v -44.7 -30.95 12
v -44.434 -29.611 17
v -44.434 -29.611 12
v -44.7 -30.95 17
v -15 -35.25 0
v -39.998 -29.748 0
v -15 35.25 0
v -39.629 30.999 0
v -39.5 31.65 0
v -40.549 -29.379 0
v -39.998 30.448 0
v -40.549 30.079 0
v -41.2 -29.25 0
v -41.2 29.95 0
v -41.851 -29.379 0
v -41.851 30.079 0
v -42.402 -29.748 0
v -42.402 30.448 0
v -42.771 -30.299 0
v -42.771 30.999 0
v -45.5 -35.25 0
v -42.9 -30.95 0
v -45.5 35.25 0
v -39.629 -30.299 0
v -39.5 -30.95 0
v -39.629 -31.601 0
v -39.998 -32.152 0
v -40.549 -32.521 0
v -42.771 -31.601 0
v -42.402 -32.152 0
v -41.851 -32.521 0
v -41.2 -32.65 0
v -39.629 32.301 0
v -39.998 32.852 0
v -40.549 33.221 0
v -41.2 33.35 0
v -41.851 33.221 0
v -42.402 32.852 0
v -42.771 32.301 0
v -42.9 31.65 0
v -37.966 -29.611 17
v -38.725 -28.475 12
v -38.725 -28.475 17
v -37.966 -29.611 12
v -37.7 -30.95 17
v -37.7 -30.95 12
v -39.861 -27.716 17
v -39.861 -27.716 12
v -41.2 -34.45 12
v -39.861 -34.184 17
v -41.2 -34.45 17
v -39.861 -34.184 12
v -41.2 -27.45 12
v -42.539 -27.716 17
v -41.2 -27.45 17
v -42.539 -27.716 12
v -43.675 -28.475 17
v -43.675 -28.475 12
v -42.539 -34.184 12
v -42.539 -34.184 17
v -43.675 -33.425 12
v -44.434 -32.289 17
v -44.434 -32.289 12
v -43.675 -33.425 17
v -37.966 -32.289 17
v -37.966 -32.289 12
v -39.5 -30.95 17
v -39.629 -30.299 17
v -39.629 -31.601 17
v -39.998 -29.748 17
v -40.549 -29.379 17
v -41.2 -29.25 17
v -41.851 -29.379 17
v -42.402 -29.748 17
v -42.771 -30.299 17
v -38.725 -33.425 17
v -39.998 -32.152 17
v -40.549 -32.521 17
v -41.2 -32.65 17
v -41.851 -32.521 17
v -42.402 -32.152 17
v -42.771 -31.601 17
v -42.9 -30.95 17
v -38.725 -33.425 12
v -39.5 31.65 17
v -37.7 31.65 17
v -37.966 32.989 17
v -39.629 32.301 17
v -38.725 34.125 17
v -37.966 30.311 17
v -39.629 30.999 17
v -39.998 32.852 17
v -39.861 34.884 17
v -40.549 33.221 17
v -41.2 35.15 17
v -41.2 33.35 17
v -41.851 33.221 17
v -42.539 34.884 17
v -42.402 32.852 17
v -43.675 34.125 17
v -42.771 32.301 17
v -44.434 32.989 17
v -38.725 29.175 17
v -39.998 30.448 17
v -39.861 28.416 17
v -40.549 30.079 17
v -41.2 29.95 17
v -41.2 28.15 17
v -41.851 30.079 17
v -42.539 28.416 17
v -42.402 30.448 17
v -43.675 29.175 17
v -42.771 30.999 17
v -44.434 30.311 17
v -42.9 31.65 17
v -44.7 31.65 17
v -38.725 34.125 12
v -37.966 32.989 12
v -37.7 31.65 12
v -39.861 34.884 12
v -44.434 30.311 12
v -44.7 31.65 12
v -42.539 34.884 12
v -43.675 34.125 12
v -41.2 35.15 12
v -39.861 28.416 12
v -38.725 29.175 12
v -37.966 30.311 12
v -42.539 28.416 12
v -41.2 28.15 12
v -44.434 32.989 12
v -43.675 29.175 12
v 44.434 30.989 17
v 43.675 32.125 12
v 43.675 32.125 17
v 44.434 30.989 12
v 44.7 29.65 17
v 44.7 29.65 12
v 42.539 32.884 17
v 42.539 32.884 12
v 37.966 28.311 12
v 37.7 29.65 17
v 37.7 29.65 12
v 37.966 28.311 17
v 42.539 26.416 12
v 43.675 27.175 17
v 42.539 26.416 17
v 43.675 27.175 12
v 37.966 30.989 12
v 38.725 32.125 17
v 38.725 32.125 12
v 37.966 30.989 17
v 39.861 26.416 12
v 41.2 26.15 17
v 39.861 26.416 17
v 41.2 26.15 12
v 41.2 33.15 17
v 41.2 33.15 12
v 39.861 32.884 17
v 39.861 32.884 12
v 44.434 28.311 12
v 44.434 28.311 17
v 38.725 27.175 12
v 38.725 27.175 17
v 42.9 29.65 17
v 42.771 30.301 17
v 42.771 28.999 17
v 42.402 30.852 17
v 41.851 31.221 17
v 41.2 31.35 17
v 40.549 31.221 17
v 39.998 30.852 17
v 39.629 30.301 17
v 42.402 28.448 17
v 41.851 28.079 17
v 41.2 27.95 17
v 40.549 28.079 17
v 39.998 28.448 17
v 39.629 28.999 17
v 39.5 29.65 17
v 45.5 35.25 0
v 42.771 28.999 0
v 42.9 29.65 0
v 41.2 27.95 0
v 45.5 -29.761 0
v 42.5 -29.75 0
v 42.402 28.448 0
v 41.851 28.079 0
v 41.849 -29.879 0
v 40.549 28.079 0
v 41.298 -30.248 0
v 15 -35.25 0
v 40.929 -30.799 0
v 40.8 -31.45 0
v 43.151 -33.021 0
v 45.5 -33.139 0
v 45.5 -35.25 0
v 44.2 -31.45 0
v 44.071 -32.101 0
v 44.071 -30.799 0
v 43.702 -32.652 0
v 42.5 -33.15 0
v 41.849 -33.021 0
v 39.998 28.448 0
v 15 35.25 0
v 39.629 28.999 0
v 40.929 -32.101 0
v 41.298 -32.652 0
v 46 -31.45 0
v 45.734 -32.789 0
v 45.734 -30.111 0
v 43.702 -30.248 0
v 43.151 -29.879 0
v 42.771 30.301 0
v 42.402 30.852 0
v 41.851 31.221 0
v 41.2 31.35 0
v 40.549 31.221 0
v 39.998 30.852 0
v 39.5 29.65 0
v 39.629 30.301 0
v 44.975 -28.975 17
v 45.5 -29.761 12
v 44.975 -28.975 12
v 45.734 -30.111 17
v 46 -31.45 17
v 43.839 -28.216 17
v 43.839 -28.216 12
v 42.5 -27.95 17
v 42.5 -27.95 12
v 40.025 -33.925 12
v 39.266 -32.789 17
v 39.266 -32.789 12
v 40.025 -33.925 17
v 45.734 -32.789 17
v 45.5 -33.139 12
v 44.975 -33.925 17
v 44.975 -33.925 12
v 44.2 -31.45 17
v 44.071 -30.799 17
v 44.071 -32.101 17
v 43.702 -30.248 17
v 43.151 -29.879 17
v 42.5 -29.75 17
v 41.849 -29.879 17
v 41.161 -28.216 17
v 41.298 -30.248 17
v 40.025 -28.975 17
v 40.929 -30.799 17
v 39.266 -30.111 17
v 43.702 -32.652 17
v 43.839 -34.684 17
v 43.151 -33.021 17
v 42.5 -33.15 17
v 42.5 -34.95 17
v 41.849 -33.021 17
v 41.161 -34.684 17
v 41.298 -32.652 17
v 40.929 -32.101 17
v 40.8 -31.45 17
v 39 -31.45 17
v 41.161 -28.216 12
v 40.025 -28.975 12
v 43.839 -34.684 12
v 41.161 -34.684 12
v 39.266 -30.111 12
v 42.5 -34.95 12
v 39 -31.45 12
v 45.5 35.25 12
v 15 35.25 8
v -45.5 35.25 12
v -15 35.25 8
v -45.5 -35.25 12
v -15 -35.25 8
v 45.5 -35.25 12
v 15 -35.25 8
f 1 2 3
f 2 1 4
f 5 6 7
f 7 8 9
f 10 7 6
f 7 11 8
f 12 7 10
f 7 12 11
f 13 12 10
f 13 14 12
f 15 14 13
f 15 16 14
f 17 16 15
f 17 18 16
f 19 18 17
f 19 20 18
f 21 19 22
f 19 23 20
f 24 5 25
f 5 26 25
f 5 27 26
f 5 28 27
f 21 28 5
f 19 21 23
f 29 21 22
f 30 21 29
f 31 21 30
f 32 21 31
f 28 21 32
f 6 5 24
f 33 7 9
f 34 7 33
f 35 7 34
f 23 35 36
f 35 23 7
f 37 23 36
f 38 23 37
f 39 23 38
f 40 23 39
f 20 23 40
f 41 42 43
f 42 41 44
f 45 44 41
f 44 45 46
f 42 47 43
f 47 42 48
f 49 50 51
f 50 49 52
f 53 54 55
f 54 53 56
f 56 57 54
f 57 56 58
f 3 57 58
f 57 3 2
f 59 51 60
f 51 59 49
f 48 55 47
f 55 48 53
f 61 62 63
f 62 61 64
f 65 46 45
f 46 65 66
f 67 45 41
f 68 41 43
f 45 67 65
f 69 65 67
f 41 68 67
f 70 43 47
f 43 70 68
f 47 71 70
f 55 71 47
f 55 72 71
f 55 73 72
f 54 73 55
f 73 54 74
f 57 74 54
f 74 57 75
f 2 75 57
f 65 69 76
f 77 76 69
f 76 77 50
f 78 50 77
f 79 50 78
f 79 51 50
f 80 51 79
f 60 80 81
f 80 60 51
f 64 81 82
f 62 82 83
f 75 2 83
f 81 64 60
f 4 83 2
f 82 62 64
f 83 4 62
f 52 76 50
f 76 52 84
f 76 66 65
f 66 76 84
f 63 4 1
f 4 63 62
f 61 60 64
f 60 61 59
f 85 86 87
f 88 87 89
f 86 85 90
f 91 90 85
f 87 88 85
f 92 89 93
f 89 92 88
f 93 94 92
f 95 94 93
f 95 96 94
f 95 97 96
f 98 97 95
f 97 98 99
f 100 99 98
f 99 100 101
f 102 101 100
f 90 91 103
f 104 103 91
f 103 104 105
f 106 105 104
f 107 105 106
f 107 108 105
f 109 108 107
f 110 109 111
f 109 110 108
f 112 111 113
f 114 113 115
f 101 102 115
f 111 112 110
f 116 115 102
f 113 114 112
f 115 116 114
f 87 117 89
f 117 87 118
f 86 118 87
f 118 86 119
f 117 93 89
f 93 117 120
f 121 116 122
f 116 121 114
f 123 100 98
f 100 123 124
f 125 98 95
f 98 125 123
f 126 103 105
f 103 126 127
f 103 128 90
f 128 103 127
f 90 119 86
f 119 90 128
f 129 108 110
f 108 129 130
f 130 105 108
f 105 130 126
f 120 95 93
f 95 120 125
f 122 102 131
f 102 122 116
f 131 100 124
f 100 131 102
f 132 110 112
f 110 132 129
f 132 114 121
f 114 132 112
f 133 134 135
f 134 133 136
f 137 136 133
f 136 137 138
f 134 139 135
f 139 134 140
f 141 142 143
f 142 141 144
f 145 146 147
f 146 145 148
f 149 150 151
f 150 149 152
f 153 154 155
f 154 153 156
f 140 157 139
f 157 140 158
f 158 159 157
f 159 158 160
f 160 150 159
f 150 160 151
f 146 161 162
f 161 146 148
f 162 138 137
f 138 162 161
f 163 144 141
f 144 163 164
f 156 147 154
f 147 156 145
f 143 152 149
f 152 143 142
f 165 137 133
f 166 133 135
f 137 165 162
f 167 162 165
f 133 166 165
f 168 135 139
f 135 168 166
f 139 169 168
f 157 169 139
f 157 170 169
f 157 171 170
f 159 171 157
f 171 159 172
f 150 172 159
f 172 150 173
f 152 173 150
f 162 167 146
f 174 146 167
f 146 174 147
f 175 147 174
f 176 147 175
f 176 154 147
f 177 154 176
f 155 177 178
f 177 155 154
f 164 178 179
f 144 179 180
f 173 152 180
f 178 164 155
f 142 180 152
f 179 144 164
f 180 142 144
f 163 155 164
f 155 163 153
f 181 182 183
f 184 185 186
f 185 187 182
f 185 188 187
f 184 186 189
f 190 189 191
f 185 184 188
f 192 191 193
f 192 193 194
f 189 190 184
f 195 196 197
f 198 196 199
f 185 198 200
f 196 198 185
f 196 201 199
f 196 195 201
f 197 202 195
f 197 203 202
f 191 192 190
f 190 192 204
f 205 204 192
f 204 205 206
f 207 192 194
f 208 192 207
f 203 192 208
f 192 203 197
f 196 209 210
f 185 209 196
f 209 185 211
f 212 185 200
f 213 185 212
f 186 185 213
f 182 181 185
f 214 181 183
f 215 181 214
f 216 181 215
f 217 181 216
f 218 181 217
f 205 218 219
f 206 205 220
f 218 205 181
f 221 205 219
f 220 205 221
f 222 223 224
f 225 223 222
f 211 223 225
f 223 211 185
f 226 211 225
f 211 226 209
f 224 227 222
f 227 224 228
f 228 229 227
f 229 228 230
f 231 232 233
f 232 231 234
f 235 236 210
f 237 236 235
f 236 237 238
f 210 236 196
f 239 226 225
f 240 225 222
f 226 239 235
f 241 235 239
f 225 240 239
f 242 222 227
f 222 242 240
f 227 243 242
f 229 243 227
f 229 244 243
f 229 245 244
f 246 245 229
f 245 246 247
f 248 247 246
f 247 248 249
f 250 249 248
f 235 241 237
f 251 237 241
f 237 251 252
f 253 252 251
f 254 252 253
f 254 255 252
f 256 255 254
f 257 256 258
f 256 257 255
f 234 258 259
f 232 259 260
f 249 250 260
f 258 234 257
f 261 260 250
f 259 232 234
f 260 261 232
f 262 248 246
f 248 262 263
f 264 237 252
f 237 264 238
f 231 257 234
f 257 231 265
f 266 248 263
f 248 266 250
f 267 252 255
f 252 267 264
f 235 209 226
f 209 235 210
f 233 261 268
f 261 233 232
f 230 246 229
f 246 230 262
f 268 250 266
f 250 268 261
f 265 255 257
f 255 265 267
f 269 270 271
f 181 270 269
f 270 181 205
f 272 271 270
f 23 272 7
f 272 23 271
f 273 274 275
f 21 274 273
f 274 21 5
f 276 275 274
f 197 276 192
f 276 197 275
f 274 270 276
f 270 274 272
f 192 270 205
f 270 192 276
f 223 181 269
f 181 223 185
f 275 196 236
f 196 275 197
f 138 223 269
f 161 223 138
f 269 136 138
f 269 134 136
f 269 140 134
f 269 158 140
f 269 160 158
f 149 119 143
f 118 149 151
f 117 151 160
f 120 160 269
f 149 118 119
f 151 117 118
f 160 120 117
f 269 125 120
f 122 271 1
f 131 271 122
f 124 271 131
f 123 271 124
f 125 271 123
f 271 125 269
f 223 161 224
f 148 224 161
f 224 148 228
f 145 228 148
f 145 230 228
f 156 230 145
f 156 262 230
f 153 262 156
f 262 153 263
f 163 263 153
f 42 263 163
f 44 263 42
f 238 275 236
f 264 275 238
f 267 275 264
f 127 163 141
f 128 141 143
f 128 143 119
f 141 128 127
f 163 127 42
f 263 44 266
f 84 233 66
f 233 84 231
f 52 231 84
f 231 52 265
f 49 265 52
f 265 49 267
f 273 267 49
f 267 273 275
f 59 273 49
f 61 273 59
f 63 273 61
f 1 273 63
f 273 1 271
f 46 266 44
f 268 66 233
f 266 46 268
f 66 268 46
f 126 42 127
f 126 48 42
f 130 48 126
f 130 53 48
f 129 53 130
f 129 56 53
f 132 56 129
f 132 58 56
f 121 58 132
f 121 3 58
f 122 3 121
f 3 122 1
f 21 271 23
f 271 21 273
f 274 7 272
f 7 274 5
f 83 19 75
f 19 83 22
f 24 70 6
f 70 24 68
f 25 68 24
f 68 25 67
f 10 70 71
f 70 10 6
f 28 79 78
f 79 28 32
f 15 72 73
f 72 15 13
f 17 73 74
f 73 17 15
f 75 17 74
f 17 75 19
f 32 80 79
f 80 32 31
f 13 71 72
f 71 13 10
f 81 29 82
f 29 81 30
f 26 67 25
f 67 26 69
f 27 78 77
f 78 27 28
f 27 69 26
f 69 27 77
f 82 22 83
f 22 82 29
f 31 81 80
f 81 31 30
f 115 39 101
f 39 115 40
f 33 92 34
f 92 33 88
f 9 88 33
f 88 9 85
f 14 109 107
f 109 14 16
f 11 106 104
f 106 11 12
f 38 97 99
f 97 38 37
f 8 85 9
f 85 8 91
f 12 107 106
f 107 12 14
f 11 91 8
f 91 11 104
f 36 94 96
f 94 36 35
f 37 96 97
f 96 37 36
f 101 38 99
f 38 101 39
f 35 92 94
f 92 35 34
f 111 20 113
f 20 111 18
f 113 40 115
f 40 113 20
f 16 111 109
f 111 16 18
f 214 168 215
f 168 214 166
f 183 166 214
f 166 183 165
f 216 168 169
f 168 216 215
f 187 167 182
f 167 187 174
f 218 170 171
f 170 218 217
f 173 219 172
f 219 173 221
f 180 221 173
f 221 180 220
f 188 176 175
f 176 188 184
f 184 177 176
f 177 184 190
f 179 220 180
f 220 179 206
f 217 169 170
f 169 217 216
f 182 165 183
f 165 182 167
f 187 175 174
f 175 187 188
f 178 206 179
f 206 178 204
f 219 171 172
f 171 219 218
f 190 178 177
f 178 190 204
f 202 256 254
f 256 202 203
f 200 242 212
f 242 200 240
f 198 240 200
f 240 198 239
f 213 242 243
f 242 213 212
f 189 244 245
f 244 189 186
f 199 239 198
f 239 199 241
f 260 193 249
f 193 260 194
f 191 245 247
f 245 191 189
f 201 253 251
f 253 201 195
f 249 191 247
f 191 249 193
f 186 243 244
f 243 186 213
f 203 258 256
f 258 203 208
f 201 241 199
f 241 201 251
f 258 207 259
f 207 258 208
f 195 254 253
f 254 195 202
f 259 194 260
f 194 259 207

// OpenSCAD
//electronics enclosure 
base_w = 80;
base_l = 85;
base_screw_y_offs = 18;
base_screw_d = 3;
base_t = 4;
wall_t = 2;
xy_clearence = 3;
xy_tol = 0.2;

//body (jeep)
body_rear_mount_w = 91;
body_rear_mount_z = 12;
body_rear_mount_x = -80; 
body_front_mount_w = 67;
body_front_mount_z = 32;
body_front_mount_x = 140;
interior_clearence = 52;

//electronics 
perf_board_w = 70.5;
perf_board_l = 91;
perf_board_t = 1.2; 
perf_board_hole_d = 3;
perf_board_holes = [
    [-perf_board_l/2+4.3, -perf_board_w/2+4.3],
    [-perf_board_l/2+4.3, perf_board_w/2-3.6],
    [perf_board_l/2-4.3, perf_board_w/2-5.6],
    [perf_board_l/2-3, -perf_board_w/2+3.8],
];



enclosure_w = perf_board_w + 2*(xy_clearence + wall_t);
enclosure_l = perf_board_l + 2*(xy_clearence + wall_t);
enclosure_x_offs = 8;
enclosure_z_offs = 12;
enclosure_h = 50;

//hardware
bolt_d = 3;
nut_w = 5.4;
nut_r = nut_w/(2*cos(30));
nut_h = 2.27;
nut_tol = nut_h + xy_tol + wall_t;


//echo(nut_r);


//assembly();

module assembly() {
    
    
    
    translate([enclosure_x_offs,0,10]) {
        translate([0,0,enclosure_z_offs + 12])
        board();
        
        translate([0,0,enclosure_z_offs + 12 + 25])
        board();
    }

    
    electronics_base();

    body();
    
}



module body() {
    
    for(i=[-body_rear_mount_w/2,body_rear_mount_w/2])
    translate([body_rear_mount_x,i,body_rear_mount_z])
    cylinder(r=4, h = 30);
    
    for(i=[-body_front_mount_w/2,body_front_mount_w/2])
    translate([body_front_mount_x,i,body_front_mount_z])
    cylinder(r=4, h = 30);
    
}

  //  linear_extrude(12)
    //square([10, 10], center=true);
    

module nut_negative() {
    cylinder(r=nut_r+xy_tol,h = nut_h + 2*xy_tol, $fn=6);
    translate([0,0,-2])
    cylinder(r=bolt_d/2+xy_tol, h = 30, $fn=16, center = true);
}

/*
difference() {
    cylinder(r=7, h=8);

    translate([0,0,8 - nut_tol])
    nut_negative();
}
*/

//electronics_base();
module electronics_base() {
    
    
difference() {
    union() {
    difference() {
        
        //body exterior, screw mounts for lid
        union() {
            linear_extrude(12)
            square([base_l, base_w], center=true);
            
            hull() {
                translate([0,0,12])
                linear_extrude(1)
                square([base_l, base_w], center=true);
                
                
                translate([enclosure_x_offs, 0, enclosure_z_offs + 12])
                linear_extrude(1)
                square([enclosure_l, enclosure_w], center=true);
            }
            
              translate([enclosure_l/2 + enclosure_x_offs - enclosure_z_offs - 12 - 1,0,0]) 
           multmatrix([
            [1,0,1,0],
            [0,1,0,0],
            [0,0,1,0],
            [0,0,0,1]
           ])
           cylinder(h = enclosure_z_offs + 12 + 1, r1 = 15, r2=10);
           
           translate([- enclosure_l/2 + enclosure_x_offs ,0,0]) 
           cylinder(h = enclosure_z_offs + 12 + 1, r1 = 0, r2=10);

        }
            
        //interior of base
        translate([0,0,3])
        linear_extrude(12)
        square([base_l-2*wall_t , base_w-2*wall_t], center=true);
        
        //interior space
        hull() {
            translate([0,0,12])
            linear_extrude(1)
            square([base_l-2*wall_t, base_w-2*wall_t], center=true);
            
            translate([enclosure_x_offs, 0, enclosure_z_offs + 12])
            linear_extrude(1)
            square([enclosure_l-2*wall_t, enclosure_w-2*wall_t], center=true);
             
            translate([enclosure_x_offs, 0, enclosure_z_offs + 12 + 1])
            linear_extrude(1)
            square([enclosure_l-2*wall_t, enclosure_w-2*wall_t], center=true);
        }
        
        //bottom screw hole
        translate([-base_l/2 + base_screw_y_offs, 0])
        cylinder(r=base_screw_d/2+xy_tol, h = 15, $fn=16, center = true);
       
    }
    
    //board mounts
    intersection() {
        union()
        translate([enclosure_x_offs,0,0]) {
            translate([-enclosure_l/2, -enclosure_w/2, enclosure_z_offs + 12 + 1 ])
            corner_support();
            
            translate([-enclosure_l/2, enclosure_w/2, enclosure_z_offs + 12 + 1 ])
            mirror([0,1,0])
            corner_support();
            
            translate([enclosure_l/2, -enclosure_w/2, enclosure_z_offs + 12 + 1 ])
            rotate(90)
            corner_support();
            
            translate([enclosure_l/2, enclosure_w/2, enclosure_z_offs + 12 + 1 ])
            mirror([0,1,0])
            rotate(90)
            corner_support();
        }
        hull() {
            translate([0,0,12])
            linear_extrude(1)
            square([base_l, base_w], center=true);
            
            
            translate([enclosure_x_offs, 0, enclosure_z_offs + 12])
            linear_extrude(1)
            square([enclosure_l, enclosure_w], center=true);
        }
   }
   }
   
    for(xy = perf_board_holes)
        translate([0,0,enclosure_z_offs + 13 - nut_h - xy_tol - wall_t])
        translate(xy + [enclosure_x_offs, 0])
        nut_negative();
   
    for(x=[-enclosure_l/2 - 3,enclosure_l/2 + 3])
    translate([x + enclosure_x_offs,0,enclosure_z_offs + 13 - nut_h - xy_tol - wall_t])
    nut_negative();
}
    
}

//corner_support();

module corner_support() {
    /*
    translate([0,0,-14])
    hull() {
        cube([1,1,1]);
        
        translate([0,0,12])
        cube([15,15,2]);
        
    }
    */
    translate([0,0,-15])
    hull() {
        
    cube([15,1,1]);
    
    translate([0,0,13])
        cube([15,15,2]);
    }
    
}

//board();
module board() {
    color("SaddleBrown")
    linear_extrude(perf_board_t)
    difference() {
        square(size=[perf_board_l, perf_board_w],center=true);
        
        for(xy = perf_board_holes)
        translate(xy)
        circle(r=perf_board_hole_d/2,$fn=16);
        
    }
    
}


power_board_bottom();
module power_board_bottom() {
    
    difference() {
        union() {
            rotate([90,0,0])
            linear_extrude(perf_board_w,center=true)
            polygon([
                [-perf_board_l/2,0],
                [-15,0],
                [-15,8],
                [15,8],
                [15,0],
                [perf_board_l/2,0],
                [perf_board_l/2,12],
                [-perf_board_l/2,12],
            ]);
            
            for(xy = perf_board_holes)
            translate(xy)
            cylinder(r=perf_board_hole_d/2 + wall_t,h=17,$fn=16);
        }
        
        for(xy = perf_board_holes)
        translate(xy)
        cylinder(r=perf_board_hole_d/2+xy_tol,h=60,center=true,$fn=16);
    }
    
    
}


//spacer();

module spacer() {
    color("fuchsia")
    linear_extrude(25)
    difference() {
        circle(r=bolt_d/2+xy_tol+wall_t,$fn=16);
        circle(r=bolt_d/2+xy_tol,$fn=16); 
    }
}
